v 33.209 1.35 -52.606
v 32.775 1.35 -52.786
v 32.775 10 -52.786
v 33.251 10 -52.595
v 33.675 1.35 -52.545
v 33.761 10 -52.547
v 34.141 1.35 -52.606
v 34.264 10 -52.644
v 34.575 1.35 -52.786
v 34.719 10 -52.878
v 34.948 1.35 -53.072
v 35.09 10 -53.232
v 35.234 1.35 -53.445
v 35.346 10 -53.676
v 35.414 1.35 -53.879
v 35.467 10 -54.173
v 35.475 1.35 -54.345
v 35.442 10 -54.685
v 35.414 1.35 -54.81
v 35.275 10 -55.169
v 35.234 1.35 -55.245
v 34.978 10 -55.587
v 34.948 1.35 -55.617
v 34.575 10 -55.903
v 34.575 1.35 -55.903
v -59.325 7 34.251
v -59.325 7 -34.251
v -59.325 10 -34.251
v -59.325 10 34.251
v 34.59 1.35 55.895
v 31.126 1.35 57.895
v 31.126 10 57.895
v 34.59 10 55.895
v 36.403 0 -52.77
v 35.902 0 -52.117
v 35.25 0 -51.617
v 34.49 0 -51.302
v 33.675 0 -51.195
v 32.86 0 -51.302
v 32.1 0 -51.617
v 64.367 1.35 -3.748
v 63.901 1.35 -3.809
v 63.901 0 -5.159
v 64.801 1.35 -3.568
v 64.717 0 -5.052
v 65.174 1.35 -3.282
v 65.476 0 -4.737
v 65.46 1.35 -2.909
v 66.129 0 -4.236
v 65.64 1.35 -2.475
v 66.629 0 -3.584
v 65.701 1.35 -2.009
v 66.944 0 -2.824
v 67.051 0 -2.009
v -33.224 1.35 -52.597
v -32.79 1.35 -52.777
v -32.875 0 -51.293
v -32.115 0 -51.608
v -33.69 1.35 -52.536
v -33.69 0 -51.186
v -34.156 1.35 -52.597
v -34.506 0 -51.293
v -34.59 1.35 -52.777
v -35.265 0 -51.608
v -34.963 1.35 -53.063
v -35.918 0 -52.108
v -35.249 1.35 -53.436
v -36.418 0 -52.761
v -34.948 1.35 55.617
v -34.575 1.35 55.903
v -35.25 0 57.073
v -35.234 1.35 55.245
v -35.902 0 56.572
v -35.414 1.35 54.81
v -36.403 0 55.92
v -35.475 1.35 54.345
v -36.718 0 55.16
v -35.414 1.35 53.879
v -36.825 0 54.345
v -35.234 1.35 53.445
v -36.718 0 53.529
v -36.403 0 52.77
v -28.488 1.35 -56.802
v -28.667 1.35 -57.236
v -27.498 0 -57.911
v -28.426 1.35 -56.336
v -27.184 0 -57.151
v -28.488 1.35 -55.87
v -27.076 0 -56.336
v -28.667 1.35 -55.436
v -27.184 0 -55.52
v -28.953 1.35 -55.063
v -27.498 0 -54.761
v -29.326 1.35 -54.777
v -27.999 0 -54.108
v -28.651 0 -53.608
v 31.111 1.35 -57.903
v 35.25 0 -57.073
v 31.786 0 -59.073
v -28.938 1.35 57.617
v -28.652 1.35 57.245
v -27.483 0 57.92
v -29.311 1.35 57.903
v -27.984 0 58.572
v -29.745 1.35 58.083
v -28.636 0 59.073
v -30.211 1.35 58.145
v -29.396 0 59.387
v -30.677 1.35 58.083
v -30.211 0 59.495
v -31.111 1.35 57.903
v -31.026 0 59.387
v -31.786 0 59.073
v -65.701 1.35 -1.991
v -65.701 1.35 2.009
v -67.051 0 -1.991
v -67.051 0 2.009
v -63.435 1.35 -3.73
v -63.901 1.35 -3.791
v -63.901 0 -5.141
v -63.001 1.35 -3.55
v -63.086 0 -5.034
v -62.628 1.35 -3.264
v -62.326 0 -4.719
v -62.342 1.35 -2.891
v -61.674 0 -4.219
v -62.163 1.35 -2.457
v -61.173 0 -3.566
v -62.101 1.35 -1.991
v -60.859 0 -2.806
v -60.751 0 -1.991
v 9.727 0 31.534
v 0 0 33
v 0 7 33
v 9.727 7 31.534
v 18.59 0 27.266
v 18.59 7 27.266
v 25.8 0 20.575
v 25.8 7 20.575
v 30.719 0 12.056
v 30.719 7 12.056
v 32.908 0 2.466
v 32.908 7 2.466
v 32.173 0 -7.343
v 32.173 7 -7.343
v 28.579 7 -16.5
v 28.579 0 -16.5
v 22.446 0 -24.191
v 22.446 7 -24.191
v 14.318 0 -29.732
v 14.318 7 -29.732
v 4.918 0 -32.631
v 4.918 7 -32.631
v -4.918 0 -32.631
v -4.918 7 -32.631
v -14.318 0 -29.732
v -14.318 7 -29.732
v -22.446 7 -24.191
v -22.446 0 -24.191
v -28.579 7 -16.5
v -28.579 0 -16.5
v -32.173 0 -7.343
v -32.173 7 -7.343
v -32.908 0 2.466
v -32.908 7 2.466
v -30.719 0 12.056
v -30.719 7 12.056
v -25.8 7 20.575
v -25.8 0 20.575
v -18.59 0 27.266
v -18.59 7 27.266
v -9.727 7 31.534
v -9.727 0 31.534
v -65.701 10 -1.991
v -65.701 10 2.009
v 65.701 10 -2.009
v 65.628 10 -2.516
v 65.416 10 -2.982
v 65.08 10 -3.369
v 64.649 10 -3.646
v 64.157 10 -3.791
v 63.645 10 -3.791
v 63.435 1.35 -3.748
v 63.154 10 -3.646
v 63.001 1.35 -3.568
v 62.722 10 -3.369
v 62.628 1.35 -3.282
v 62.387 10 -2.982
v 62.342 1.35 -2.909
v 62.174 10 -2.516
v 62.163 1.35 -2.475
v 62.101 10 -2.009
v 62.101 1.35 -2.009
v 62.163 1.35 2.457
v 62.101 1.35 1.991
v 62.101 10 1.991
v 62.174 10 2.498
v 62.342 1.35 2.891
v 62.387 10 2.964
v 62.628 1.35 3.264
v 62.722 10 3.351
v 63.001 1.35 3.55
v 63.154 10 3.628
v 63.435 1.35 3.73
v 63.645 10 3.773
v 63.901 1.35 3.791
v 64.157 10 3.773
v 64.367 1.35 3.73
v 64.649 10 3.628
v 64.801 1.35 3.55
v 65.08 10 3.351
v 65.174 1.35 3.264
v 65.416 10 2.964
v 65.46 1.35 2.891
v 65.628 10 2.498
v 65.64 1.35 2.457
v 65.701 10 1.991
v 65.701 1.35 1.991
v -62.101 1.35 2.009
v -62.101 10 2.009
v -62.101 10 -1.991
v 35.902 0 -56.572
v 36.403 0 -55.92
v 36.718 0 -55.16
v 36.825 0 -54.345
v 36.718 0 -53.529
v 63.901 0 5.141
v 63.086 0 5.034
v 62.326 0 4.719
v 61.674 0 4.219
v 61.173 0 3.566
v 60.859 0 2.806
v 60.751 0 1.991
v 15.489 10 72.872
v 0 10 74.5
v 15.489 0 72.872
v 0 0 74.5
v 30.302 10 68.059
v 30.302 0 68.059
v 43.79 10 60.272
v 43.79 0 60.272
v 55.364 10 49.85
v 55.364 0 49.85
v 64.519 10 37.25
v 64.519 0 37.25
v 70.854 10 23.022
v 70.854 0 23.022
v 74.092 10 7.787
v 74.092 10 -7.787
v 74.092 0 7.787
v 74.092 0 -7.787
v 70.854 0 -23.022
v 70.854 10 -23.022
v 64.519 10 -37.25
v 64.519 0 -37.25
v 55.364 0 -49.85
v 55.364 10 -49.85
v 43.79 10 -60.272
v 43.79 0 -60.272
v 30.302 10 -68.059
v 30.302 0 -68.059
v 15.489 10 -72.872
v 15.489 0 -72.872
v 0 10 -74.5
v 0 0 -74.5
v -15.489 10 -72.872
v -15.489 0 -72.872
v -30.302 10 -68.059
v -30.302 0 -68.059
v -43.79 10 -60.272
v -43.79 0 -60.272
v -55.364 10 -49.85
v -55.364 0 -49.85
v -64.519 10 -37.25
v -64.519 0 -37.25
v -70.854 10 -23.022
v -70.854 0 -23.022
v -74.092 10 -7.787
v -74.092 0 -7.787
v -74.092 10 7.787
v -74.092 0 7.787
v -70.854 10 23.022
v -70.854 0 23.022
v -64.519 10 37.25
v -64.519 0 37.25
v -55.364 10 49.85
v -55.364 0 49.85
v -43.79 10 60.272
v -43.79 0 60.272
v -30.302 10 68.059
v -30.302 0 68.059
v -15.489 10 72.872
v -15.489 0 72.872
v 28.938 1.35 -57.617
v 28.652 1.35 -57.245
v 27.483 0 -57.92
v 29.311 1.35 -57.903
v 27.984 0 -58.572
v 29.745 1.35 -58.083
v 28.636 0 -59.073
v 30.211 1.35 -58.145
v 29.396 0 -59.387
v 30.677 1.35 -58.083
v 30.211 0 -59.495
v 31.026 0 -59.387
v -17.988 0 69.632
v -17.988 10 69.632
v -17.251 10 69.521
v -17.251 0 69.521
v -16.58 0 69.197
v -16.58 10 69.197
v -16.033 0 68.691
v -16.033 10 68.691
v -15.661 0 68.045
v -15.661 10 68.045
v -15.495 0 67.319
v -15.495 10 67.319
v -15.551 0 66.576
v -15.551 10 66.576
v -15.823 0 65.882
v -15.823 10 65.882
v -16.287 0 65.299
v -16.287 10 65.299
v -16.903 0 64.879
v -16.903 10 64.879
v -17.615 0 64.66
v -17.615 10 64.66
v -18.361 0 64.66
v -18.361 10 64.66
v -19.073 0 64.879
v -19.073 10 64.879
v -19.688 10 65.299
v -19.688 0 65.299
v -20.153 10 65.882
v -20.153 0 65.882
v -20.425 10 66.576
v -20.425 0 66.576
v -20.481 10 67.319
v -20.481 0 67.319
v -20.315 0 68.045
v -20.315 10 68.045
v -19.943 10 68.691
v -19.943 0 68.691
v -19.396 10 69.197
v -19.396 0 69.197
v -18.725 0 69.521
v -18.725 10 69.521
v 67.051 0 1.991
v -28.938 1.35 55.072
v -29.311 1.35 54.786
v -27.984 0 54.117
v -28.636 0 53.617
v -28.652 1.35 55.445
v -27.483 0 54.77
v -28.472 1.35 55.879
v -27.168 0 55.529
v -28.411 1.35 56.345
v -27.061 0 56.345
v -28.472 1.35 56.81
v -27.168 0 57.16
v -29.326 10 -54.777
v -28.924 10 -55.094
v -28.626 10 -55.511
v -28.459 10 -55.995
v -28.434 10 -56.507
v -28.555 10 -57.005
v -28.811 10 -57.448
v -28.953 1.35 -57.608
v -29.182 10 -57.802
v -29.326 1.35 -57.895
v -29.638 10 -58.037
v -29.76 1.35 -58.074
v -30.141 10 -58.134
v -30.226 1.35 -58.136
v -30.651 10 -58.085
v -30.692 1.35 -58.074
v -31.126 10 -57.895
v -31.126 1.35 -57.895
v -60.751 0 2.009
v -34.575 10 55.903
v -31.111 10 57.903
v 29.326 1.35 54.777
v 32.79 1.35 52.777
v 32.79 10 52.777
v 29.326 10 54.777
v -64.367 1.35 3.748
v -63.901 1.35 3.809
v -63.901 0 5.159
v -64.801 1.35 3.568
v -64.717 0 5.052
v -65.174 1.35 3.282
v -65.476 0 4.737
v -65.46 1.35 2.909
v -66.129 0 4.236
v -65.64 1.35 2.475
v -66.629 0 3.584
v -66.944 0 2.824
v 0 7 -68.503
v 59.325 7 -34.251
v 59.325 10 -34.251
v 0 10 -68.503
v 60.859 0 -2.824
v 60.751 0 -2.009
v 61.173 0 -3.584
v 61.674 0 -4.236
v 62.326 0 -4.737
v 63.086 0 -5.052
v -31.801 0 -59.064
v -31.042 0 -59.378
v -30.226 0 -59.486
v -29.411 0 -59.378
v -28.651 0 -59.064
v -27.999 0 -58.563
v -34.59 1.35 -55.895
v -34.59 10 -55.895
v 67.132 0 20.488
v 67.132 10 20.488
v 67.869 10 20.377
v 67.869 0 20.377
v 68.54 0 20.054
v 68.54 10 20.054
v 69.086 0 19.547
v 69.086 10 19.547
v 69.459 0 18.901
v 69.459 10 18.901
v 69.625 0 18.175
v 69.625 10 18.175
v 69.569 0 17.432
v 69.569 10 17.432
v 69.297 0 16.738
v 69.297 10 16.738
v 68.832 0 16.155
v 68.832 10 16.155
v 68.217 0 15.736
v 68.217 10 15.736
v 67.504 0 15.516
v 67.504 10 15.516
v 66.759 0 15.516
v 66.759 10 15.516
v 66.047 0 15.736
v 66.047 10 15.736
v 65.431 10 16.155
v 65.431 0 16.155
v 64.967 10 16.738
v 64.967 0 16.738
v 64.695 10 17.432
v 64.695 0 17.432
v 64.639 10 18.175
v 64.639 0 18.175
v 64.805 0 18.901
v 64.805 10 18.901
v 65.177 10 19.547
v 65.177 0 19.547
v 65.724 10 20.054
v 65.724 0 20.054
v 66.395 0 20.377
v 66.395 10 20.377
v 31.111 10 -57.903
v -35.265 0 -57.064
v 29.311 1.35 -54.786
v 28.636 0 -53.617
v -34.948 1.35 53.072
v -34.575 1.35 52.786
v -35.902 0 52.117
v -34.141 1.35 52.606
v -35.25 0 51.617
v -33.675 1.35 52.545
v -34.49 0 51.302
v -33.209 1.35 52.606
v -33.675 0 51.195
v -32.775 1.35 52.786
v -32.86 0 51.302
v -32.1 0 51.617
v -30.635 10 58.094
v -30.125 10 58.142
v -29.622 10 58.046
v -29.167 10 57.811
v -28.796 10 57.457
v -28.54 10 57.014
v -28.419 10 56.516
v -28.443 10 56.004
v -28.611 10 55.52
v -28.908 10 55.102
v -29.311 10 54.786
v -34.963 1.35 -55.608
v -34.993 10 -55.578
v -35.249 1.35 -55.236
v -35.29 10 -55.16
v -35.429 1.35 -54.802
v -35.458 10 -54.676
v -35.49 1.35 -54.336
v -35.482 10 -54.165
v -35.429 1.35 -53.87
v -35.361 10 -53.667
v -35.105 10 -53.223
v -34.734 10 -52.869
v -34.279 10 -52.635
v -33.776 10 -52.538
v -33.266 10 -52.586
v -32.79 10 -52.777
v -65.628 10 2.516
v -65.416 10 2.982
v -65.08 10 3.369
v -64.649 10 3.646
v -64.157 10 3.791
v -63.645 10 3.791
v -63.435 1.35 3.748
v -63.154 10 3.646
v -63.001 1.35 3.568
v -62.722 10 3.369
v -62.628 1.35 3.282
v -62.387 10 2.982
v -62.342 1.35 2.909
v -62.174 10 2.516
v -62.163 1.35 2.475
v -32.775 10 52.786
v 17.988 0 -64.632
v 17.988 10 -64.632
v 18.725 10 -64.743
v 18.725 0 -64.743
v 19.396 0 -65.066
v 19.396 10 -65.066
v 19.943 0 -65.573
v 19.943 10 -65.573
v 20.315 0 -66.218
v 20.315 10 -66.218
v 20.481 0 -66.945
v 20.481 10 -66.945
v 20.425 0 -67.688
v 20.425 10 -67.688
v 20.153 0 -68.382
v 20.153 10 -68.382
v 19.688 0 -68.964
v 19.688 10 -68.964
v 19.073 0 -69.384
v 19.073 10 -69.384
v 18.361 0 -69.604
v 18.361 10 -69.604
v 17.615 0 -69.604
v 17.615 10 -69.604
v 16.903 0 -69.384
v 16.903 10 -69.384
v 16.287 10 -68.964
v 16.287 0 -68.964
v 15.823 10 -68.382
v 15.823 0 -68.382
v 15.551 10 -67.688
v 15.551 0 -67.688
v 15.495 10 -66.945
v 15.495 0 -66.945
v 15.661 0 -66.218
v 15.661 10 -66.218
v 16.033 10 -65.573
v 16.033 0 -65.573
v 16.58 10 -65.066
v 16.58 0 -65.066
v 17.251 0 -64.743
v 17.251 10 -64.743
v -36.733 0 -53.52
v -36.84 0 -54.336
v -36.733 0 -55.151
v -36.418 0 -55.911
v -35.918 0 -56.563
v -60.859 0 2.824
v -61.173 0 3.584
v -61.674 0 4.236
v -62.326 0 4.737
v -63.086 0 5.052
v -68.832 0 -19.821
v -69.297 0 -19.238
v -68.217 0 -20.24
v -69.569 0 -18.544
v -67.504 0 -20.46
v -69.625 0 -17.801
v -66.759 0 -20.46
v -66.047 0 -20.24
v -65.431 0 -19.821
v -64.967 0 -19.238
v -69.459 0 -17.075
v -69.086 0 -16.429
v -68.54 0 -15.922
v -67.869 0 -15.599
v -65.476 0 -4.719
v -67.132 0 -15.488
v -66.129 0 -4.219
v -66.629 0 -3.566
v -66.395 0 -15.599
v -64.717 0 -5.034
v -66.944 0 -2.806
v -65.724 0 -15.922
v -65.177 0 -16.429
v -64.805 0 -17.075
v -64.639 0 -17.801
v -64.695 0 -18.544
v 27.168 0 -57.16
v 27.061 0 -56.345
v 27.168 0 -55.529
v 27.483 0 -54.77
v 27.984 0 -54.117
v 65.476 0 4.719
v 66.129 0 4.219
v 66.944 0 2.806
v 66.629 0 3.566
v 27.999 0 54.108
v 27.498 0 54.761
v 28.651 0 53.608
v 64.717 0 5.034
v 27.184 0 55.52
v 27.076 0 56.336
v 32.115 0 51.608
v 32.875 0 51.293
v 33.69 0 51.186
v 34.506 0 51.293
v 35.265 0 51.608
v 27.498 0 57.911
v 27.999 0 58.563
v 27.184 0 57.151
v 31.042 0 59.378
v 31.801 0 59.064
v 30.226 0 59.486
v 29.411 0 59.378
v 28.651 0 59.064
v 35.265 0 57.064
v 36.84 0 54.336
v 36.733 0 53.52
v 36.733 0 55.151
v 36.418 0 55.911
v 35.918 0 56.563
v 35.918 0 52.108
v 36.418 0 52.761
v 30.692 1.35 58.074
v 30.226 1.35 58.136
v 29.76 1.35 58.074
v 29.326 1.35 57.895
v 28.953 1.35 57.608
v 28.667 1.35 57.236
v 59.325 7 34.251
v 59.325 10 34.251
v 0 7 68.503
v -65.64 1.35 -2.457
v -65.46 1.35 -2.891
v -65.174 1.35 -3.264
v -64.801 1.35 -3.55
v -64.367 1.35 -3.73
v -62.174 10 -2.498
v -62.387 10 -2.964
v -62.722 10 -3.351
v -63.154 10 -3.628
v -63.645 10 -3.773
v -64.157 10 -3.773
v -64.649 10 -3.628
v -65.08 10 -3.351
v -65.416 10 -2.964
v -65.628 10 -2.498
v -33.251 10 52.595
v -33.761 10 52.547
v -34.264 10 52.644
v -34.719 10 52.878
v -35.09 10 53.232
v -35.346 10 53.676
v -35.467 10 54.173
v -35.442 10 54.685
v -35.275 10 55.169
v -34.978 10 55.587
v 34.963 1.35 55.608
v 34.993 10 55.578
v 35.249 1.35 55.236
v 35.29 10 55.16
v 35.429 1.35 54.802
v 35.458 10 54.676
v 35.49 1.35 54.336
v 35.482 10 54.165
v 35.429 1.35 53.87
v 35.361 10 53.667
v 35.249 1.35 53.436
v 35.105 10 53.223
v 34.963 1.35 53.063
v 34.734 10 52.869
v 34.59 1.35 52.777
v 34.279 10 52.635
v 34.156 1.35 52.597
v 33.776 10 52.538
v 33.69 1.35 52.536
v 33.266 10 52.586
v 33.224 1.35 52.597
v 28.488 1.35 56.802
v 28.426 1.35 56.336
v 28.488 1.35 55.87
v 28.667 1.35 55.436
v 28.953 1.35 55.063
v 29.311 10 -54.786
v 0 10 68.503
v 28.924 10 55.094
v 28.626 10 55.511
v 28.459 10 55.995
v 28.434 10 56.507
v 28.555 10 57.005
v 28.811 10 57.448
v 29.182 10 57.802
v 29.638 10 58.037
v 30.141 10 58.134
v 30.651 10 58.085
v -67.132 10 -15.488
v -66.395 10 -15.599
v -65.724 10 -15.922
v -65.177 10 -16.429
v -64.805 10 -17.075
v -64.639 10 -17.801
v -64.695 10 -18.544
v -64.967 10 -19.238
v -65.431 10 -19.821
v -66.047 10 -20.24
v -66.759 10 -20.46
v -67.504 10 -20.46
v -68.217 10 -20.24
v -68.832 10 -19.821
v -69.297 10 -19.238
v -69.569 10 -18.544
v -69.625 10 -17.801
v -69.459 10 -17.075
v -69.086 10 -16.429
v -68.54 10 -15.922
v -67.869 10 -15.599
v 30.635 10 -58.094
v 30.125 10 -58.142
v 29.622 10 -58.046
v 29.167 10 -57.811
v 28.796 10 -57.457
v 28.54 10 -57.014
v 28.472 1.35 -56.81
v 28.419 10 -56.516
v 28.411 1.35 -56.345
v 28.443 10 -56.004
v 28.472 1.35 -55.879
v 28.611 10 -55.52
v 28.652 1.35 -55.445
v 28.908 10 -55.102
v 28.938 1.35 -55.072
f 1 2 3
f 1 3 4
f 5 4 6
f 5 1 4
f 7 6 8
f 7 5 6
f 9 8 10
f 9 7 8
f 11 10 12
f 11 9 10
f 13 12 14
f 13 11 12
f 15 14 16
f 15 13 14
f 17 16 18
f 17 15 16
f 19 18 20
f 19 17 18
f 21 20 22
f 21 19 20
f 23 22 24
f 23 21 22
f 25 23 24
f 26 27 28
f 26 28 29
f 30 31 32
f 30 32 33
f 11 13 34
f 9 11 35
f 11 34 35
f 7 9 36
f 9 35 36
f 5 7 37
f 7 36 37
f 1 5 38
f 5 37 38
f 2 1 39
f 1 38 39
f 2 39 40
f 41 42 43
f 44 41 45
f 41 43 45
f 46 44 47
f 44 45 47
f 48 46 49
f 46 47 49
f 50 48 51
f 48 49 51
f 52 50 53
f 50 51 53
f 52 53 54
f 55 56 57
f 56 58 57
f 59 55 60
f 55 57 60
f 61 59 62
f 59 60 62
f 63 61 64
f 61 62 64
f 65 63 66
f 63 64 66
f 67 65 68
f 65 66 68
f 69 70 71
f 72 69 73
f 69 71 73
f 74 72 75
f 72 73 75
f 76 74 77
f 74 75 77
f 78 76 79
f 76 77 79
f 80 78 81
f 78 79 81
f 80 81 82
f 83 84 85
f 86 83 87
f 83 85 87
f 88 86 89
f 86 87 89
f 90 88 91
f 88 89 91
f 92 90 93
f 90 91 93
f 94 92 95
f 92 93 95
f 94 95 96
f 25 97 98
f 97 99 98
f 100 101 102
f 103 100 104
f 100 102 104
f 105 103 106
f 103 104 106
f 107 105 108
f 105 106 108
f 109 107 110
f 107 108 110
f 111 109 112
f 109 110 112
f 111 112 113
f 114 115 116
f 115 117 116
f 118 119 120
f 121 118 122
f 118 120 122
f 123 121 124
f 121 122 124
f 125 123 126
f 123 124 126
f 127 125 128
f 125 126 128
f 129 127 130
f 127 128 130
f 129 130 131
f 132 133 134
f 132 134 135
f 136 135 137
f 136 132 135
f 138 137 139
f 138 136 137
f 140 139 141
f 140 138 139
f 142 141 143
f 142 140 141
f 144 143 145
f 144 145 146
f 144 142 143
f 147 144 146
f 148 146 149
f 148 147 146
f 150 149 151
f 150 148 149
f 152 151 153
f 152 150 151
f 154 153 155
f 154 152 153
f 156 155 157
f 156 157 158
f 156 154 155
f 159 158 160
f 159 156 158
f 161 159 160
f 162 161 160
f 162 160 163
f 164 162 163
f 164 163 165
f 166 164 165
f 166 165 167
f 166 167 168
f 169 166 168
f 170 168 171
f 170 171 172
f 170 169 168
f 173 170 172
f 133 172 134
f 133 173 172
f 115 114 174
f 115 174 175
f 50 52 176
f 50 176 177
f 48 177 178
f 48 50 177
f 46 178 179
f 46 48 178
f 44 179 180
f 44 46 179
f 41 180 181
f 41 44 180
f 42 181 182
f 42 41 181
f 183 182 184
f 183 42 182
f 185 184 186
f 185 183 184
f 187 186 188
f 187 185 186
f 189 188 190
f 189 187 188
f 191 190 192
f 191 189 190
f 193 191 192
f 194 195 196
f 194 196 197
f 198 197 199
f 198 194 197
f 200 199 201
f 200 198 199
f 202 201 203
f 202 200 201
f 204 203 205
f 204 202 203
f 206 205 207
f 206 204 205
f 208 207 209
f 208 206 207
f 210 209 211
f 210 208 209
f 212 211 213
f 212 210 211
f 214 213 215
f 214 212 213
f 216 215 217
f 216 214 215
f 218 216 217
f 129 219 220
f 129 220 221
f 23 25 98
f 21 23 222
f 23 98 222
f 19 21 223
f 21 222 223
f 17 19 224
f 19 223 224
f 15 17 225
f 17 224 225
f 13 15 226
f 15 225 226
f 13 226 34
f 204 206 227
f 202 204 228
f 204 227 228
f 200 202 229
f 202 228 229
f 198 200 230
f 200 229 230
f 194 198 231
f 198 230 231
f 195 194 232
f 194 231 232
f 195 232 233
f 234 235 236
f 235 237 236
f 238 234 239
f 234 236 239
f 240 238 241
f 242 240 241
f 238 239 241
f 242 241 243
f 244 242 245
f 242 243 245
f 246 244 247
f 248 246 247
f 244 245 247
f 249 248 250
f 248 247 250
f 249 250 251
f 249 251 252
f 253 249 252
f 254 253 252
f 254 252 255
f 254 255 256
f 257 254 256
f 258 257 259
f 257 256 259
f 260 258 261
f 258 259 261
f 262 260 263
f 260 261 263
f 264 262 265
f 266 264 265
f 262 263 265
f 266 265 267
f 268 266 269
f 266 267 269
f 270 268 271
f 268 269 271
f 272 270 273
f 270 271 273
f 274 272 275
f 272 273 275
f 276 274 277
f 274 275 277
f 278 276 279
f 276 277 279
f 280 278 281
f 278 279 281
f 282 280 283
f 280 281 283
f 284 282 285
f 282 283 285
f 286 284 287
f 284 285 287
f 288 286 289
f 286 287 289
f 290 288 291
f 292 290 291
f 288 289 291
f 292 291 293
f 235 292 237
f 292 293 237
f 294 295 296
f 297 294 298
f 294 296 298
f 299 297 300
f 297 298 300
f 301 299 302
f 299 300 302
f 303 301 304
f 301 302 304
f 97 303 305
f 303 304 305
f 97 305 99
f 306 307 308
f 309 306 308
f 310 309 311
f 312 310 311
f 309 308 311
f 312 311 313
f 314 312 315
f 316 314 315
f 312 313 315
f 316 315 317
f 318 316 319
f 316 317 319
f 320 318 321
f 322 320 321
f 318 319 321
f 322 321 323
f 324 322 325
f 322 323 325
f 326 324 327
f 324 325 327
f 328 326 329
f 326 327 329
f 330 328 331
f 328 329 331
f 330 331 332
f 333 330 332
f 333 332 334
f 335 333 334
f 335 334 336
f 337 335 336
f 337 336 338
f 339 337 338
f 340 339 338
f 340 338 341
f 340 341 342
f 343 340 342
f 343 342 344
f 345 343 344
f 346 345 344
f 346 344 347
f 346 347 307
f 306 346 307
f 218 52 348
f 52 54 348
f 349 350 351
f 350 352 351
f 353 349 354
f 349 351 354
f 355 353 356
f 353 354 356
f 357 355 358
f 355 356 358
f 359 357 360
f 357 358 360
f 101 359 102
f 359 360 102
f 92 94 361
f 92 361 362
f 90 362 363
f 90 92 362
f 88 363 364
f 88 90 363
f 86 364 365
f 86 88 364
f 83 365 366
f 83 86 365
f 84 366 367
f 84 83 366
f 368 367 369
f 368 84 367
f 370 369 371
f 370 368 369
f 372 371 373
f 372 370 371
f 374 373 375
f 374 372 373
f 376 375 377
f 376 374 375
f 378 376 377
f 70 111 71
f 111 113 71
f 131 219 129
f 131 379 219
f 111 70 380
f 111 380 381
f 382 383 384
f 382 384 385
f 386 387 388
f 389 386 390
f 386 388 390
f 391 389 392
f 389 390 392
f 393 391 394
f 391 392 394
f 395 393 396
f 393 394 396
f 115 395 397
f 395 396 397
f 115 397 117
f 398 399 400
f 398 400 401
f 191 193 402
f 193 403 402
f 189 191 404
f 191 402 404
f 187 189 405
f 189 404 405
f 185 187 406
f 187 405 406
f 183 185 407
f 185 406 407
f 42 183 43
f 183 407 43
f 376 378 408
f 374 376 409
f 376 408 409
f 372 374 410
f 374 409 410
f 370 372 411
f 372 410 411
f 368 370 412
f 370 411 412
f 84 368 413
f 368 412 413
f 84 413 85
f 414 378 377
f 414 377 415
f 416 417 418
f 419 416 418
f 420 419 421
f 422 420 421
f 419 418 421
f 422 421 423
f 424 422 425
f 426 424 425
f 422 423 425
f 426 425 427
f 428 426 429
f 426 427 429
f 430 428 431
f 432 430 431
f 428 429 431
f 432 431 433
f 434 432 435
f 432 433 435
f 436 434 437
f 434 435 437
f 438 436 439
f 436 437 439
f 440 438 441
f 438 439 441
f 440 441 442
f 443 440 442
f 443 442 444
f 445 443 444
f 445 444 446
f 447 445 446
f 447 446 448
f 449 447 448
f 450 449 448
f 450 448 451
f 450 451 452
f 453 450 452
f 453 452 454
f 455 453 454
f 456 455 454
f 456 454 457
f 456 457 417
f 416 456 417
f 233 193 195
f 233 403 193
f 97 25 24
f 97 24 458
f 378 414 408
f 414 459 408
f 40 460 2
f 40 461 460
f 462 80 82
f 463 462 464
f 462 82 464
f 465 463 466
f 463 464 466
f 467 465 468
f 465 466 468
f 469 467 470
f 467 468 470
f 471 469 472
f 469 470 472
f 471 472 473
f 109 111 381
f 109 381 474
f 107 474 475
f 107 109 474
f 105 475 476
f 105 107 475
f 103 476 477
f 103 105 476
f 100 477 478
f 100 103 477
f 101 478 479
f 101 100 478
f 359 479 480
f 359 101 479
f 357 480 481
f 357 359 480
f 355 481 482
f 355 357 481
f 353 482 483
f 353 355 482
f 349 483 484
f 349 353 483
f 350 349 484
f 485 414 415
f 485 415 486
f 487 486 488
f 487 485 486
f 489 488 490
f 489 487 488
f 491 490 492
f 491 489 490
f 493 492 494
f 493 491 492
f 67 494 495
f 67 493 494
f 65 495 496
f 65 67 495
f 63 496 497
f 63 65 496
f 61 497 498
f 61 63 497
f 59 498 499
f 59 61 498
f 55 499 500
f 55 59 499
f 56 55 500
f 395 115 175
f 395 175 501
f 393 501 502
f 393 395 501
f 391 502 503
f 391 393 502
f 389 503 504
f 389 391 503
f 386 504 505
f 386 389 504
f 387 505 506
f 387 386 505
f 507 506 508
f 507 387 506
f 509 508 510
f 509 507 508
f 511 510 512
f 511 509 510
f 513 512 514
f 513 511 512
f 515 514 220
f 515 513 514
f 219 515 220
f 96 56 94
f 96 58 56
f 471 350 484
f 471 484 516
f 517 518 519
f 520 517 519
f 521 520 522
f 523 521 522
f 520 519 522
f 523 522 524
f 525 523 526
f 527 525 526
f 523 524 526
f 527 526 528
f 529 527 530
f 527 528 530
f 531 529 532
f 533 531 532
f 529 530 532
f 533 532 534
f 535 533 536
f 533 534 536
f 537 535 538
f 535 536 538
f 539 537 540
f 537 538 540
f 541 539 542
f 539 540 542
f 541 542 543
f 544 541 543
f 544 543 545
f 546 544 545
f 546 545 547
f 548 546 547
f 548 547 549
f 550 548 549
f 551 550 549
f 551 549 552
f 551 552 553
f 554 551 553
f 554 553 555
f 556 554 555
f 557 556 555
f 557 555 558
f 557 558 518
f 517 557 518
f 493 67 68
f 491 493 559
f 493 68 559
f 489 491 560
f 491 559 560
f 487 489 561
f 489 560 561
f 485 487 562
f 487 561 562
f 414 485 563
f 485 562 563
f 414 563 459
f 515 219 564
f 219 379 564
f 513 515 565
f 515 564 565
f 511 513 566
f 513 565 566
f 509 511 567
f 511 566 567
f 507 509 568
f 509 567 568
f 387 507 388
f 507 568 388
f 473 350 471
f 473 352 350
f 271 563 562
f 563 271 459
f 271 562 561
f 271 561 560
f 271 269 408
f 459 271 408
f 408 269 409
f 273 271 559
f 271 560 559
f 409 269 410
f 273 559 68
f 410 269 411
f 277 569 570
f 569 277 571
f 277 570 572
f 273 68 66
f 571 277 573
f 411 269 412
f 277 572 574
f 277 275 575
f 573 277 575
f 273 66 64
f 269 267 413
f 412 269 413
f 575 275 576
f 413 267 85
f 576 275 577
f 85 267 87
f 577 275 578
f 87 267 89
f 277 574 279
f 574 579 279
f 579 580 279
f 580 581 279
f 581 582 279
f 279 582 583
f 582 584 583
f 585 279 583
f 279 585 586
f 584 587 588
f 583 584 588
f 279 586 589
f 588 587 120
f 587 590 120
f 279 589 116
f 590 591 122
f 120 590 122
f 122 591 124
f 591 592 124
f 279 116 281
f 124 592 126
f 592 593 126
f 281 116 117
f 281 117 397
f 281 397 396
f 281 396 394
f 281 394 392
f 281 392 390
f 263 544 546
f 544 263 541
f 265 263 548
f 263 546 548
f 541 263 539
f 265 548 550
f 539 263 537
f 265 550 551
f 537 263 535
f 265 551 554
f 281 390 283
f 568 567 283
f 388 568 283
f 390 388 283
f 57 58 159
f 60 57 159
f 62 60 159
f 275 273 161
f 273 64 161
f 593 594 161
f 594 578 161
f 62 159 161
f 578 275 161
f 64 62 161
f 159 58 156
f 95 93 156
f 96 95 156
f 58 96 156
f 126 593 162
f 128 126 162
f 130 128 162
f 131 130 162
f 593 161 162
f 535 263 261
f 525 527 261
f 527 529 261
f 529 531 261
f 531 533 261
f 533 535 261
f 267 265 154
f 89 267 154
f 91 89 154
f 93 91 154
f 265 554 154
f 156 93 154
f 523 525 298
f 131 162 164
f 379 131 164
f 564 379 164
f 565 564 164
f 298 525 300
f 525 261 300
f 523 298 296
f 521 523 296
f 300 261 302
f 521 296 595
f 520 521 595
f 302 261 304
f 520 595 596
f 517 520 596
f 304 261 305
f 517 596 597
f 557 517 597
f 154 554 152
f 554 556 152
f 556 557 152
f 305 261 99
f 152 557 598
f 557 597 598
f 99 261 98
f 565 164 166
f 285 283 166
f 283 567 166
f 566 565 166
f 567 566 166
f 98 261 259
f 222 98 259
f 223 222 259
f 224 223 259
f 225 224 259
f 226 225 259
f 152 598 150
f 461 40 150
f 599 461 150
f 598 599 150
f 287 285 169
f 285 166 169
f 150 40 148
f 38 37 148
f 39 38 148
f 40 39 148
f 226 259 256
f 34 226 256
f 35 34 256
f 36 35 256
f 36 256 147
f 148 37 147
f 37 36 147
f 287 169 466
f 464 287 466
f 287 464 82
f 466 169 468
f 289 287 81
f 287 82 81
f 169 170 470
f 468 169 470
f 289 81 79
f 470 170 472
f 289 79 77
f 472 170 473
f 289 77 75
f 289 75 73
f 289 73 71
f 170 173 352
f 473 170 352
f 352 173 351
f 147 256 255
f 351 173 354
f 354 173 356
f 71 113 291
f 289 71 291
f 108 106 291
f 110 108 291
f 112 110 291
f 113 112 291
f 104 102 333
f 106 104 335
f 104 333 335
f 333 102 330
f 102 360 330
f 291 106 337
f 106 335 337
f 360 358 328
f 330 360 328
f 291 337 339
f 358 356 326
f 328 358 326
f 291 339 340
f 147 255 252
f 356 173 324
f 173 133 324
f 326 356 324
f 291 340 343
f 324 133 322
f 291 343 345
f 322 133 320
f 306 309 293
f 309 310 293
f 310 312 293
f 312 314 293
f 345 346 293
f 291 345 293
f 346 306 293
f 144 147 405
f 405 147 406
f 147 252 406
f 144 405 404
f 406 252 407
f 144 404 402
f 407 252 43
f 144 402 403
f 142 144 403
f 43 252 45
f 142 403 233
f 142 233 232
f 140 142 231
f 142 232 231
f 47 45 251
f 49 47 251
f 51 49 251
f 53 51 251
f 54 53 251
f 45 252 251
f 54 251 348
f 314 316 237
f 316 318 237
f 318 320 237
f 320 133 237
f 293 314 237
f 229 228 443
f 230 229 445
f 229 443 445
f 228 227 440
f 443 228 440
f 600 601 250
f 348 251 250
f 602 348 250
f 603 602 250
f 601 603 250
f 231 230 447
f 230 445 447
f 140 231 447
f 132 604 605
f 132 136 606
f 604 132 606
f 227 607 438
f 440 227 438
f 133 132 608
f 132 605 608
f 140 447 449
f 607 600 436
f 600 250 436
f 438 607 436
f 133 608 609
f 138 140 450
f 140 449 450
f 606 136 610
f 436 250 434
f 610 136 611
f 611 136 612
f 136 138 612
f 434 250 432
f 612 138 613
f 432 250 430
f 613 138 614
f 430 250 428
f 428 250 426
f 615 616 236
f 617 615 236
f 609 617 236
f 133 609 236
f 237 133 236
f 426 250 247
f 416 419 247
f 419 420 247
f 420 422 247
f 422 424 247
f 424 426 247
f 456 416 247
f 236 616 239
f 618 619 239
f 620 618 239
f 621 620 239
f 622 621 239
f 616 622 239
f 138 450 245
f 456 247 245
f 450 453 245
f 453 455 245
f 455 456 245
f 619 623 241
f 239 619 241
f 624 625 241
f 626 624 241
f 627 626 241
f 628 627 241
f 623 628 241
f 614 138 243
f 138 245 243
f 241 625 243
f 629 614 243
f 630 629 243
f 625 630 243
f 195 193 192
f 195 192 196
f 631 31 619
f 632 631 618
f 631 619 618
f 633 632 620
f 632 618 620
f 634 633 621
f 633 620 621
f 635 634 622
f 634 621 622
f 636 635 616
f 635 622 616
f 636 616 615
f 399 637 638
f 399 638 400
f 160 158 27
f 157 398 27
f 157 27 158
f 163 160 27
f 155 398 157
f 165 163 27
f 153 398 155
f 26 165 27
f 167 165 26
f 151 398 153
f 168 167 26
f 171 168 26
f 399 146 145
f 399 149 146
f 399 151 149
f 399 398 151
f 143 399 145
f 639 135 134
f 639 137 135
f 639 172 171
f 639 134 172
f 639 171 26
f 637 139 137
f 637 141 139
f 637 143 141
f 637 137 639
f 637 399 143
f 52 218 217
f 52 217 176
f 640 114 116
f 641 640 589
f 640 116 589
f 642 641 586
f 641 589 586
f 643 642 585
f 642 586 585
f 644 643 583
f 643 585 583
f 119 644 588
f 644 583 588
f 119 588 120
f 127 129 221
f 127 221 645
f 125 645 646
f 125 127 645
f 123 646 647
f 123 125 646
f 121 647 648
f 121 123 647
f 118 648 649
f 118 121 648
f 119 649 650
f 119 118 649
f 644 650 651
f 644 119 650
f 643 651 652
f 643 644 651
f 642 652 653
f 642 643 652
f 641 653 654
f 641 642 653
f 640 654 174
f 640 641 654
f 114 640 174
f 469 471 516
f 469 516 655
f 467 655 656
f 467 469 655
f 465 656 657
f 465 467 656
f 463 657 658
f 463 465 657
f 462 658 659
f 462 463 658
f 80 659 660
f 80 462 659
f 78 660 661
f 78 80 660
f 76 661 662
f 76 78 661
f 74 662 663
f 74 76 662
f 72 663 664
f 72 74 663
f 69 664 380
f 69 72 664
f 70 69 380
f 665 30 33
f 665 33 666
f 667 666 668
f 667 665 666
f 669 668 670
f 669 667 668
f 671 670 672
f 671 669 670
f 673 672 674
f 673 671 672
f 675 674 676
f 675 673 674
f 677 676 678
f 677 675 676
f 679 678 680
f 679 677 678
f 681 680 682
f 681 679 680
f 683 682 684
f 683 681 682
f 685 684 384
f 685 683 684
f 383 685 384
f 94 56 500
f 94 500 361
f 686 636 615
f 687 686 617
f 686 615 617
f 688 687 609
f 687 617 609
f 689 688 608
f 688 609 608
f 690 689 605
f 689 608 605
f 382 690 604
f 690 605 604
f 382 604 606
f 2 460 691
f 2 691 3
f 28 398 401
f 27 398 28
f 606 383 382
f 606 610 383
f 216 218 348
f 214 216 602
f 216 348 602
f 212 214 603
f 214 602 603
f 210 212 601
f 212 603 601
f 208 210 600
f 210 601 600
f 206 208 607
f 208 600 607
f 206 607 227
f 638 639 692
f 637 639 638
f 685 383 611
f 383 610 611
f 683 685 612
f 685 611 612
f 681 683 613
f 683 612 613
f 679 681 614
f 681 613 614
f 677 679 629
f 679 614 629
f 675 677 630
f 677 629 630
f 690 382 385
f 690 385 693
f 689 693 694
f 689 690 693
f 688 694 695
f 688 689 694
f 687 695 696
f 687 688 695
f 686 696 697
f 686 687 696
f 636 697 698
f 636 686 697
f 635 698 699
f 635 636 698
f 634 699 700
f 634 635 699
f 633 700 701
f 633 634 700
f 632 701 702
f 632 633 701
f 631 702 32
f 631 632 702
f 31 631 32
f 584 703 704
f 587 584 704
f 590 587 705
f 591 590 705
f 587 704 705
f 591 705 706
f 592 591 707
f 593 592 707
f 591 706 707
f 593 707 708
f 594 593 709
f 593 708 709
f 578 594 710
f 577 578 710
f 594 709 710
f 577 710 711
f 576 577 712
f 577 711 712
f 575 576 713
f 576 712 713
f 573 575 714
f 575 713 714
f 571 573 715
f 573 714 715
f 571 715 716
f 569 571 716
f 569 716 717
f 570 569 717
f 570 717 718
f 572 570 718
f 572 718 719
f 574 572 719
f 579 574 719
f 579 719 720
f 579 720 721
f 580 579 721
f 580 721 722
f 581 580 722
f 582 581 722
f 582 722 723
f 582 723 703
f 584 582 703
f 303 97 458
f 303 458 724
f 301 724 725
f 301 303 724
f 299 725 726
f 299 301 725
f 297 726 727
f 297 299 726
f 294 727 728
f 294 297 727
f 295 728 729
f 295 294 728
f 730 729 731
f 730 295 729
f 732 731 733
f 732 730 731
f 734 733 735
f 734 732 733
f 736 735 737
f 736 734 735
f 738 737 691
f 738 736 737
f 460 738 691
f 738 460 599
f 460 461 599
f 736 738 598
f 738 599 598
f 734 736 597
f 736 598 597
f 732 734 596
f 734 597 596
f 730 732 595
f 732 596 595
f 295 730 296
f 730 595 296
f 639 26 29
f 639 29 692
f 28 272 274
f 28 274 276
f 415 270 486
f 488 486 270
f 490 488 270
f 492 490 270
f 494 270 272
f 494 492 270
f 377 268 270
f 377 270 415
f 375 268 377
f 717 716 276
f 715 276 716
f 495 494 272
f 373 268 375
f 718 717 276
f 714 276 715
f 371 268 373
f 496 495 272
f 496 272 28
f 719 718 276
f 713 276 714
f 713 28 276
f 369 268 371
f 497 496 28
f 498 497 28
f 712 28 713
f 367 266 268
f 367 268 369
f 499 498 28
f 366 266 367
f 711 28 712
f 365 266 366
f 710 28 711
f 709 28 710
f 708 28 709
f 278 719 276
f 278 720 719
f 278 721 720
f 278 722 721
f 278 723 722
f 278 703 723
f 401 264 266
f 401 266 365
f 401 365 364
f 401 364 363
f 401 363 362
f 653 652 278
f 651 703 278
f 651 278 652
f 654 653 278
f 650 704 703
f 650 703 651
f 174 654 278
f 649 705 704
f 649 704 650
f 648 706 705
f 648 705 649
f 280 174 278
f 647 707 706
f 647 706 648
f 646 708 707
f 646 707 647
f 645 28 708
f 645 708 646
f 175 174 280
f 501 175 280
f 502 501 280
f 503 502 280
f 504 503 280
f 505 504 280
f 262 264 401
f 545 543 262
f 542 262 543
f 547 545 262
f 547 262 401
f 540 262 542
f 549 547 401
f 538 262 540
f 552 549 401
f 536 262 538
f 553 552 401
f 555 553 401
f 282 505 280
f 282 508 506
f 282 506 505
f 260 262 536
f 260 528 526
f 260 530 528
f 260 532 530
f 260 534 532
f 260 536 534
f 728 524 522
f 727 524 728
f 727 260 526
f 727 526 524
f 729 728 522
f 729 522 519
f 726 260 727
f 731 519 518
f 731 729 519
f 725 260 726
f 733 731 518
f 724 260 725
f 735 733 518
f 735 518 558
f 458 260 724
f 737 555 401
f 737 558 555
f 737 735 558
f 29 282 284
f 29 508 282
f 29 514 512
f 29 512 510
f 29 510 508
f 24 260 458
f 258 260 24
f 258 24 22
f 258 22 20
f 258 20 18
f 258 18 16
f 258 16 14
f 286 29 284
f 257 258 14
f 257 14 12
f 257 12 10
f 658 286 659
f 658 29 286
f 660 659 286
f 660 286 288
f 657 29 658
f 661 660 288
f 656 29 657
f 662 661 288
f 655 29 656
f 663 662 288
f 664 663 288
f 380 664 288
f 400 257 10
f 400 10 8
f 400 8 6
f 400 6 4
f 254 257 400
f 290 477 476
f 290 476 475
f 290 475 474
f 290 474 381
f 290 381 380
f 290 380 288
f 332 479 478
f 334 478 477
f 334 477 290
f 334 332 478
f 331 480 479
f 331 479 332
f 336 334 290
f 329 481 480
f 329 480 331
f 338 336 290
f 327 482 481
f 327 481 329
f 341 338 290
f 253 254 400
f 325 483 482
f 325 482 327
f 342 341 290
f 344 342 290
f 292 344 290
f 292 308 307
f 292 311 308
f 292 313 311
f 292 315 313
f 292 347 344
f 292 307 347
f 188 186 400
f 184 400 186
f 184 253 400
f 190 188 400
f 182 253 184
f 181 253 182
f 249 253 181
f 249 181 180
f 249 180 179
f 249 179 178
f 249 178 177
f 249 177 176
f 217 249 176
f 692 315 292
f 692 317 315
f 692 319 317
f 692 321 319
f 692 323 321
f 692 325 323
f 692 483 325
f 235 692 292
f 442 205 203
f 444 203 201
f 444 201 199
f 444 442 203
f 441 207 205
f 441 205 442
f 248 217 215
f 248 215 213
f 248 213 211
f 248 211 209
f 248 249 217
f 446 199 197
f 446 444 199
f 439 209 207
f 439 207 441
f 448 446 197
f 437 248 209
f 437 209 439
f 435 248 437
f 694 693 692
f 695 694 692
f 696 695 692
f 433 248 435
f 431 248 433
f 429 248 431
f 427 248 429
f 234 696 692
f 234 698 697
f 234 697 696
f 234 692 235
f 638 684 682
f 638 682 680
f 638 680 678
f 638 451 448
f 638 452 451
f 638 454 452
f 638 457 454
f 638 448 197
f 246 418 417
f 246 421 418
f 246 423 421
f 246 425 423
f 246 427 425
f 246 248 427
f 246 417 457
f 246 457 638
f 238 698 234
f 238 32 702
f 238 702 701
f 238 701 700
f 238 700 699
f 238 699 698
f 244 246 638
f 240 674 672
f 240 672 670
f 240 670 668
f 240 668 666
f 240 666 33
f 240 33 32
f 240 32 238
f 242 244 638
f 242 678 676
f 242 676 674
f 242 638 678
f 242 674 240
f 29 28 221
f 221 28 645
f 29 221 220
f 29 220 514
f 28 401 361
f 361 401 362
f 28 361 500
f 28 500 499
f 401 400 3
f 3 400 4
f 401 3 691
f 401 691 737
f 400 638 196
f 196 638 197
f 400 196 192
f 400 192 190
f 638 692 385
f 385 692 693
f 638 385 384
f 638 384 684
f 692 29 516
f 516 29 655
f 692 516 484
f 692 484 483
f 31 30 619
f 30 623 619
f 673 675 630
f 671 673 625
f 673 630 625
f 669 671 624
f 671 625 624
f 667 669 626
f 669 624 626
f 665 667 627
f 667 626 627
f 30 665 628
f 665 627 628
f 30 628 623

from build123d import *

# Parameters (mm, degrees)
CROQUIS1_R                                     = 74.5
CROQUIS1_R_2                                   = 33
SALIENTE_EXTRUIR1_DEPTH                        = 7
CROQUIS2_R                                     = 74.5
SALIENTE_EXTRUIR2_DEPTH                        = 3
CROQUIS4_R                                     = 2.5
CORTAR_EXTRUIR2_DEPTH                          = 106.832414694
CSK_START                                      = -1
CSK_SLOT_FOR_M3_FLAT_HEAD_MACHINE_SCREW2_DEPTH = 12
CIRPATTERN1_COUNT                              = 6


with BuildPart() as part:
    # Croquis1 → Saliente-Extruir1 (new body)
    with BuildSketch(Plane(origin=(0, 0, 0), x_dir=(1, 0, 0), z_dir=(0, 1, 0))):
        with Locations(Location((0, 0, 0), (0, 0, 270))):
            Circle(CROQUIS1_R)
        with Locations(Location((0, 0, 0), (0, 0, 270))):
            Circle(CROQUIS1_R_2, mode=Mode.SUBTRACT)
    extrude(amount=SALIENTE_EXTRUIR1_DEPTH)

    # Croquis2 → Saliente-Extruir2 (add)
    with BuildSketch(Plane(origin=(0, 7, 0), x_dir=(1, 0, 0), z_dir=(0, 1, 0))):
        with Locations(Location((0, 0, 0), (0, 0, 270))):
            Circle(CROQUIS2_R)
        Polygon((-59.325, 34.25130472), (-59.325, -34.25130472), (0, -68.502609439), (59.325, -34.25130472), (59.325, 34.25130472), (0, 68.502609439), align=None, mode=Mode.SUBTRACT)
    extrude(amount=SALIENTE_EXTRUIR2_DEPTH)

    # Croquis4 → Cortar-Extruir2 (cut, through all)
    with BuildSketch(Plane(origin=(0, 10, 0), x_dir=(1, 0, 0), z_dir=(0, 1, 0))):
        with Locations(Location((17.987923635, 67.131844927, 0), (0, 0, 270))):
            Circle(CROQUIS4_R)
        with Locations(Location((67.131844927, -17.987923635, 0), (0, 0, 270))):
            Circle(CROQUIS4_R)
        with Locations(Location((-17.987923635, -67.131844927, 0), (0, 0, 270))):
            Circle(CROQUIS4_R)
        with Locations(Location((-67.131844927, 17.987923635, 0), (0, 0, 270))):
            Circle(CROQUIS4_R)
    extrude(amount=-CORTAR_EXTRUIR2_DEPTH, mode=Mode.SUBTRACT)

    # CSK SLOT for M3 Flat Head Machine Screw2: read off the stored shape, not the designer's step
    # CSK SLOT for M3 Flat Head Machine Sc 2 → CSK SLOT for M3 Flat Head Machine Screw2 (cut)
    with BuildSketch(Plane(origin=(0, 0, 0), x_dir=(1, 0, 0), z_dir=(0, 1, 0)).offset(CSK_START)):
        with BuildLine():
            ThreePointArc((-31.110894632, -57.903382972), (-28.652048905, -57.244537245), (-29.310894632, -54.785691518))
            Line((-29.310894632, -54.785691518), (-32.774996247, -52.785691518))
            ThreePointArc((-32.774996247, -52.785691518), (-35.233841974, -53.444537245), (-34.574996247, -55.903382972))
            Line((-34.574996247, -55.903382972), (-31.110894632, -57.903382972))
        make_face()
    csk_slot_for_m3_flat_head_machine_screw2 = extrude(amount=CSK_SLOT_FOR_M3_FLAT_HEAD_MACHINE_SCREW2_DEPTH, mode=Mode.SUBTRACT)

    # CSK SLOT for M3 Flat Head Machine Sc 3: loft between two sections, ruled curve by curve
    csk_slot_for_m3_flat_head_machine_sc_3_from = [
        Edge.make_three_point_arc((-29.310894632, 1.35, 54.785691518), (-28.472228144, 1.35, 55.878662964), (-28.652048905, 1.35, 57.244537245)),
        Edge.make_three_point_arc((-28.652048905, 1.35, 57.244537245), (-29.74502035, 1.35, 58.083203732), (-31.110894632, 1.35, 57.903382972)),
        Edge.make_three_point_arc((-34.574996247, 1.35, 55.903382972), (-35.413662734, 1.35, 54.810411526), (-35.233841974, 1.35, 53.444537245)),
        Edge.make_three_point_arc((-35.233841974, 1.35, 53.444537245), (-34.140870528, 1.35, 52.605870758), (-32.774996247, 1.35, 52.785691518)),
        Edge.make_line((-31.110894632, 1.35, 57.903382972), (-34.574996247, 1.35, 55.903382972)),
        Edge.make_line((-29.310894632, 1.35, 54.785691518), (-32.774996247, 1.35, 52.785691518)),
    ]
    csk_slot_for_m3_flat_head_machine_sc_3_to = [
        Edge.make_three_point_arc((-28.635894632, 0, 53.616557223), (-27.168228279, 0, 55.529257253), (-27.48291461, 0, 57.919537245)),
        Edge.make_three_point_arc((-27.48291461, 0, 57.919537245), (-29.39561464, 0, 59.387203598), (-31.785894632, 0, 59.072517267)),
        Edge.make_three_point_arc((-35.249996247, 0, 57.072517267), (-36.7176626, 0, 55.159817237), (-36.402976269, 0, 52.769537245)),
        Edge.make_three_point_arc((-36.402976269, 0, 52.769537245), (-34.490276239, 0, 51.301870892), (-32.099996247, 0, 51.616557223)),
        Edge.make_line((-31.785894632, 0, 59.072517267), (-35.249996247, 0, 57.072517267)),
        Edge.make_line((-28.635894632, 0, 53.616557223), (-32.099996247, 0, 51.616557223)),
    ]
    csk_slot_for_m3_flat_head_machine_sc_3 = Solid(Shell([*[Face.make_surface_from_curves(csk_slot_for_m3_flat_head_machine_sc_3_from[k], csk_slot_for_m3_flat_head_machine_sc_3_to[k]) for k in range(6)], Face(Wire(csk_slot_for_m3_flat_head_machine_sc_3_from)), Face(Wire(csk_slot_for_m3_flat_head_machine_sc_3_to))]))
    add(csk_slot_for_m3_flat_head_machine_sc_3, mode=Mode.SUBTRACT)

    # CirPattern1: CSK SLOT for M3 Flat Head Machine Screw2, CSK SLOT for M3 Flat Head Machine Sc 3 ×6 about axis
    cirpattern1_axis = Axis((0, 0, 0), (0, 1, 0))
    add([csk_slot_for_m3_flat_head_machine_screw2.rotate(cirpattern1_axis, i * 360 / CIRPATTERN1_COUNT) for i in range(1, CIRPATTERN1_COUNT)], mode=Mode.SUBTRACT)
    add([csk_slot_for_m3_flat_head_machine_sc_3.rotate(cirpattern1_axis, i * 360 / CIRPATTERN1_COUNT) for i in range(1, CIRPATTERN1_COUNT)], mode=Mode.SUBTRACT)


solid = part.part
